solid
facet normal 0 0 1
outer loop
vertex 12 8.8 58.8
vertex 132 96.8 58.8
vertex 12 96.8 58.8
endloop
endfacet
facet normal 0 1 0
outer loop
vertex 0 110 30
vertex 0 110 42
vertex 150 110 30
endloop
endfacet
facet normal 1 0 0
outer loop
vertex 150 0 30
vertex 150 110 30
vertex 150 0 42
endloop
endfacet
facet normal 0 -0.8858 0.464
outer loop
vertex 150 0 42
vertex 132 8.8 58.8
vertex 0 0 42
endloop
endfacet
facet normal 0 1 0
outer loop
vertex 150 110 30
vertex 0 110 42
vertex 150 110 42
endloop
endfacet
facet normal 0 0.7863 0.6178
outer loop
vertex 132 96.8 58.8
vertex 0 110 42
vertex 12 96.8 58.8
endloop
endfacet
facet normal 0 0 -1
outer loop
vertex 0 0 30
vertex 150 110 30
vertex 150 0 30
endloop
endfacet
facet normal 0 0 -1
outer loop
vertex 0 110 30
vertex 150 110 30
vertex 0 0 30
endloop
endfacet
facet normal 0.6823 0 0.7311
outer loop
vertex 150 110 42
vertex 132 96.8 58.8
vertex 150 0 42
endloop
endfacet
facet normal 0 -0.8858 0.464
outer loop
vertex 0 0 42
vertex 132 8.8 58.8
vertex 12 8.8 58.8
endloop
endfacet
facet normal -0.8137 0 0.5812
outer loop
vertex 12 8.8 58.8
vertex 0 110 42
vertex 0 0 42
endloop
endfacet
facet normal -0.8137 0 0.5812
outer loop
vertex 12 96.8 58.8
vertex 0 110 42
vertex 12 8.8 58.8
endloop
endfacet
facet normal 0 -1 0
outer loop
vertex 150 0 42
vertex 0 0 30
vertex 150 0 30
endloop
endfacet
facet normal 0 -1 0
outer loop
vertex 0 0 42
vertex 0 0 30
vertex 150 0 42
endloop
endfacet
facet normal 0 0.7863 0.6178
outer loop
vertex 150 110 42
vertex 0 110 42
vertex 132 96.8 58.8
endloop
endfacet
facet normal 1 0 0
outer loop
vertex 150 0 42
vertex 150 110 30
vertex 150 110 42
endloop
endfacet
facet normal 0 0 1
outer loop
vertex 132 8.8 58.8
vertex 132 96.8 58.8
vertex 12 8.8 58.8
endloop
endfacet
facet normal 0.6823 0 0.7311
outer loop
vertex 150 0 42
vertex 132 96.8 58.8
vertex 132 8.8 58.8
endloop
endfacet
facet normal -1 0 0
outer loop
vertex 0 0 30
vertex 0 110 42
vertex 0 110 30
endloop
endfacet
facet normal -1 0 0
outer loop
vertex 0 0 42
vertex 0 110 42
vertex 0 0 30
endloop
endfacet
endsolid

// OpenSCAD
// LED dome — REFERENCE MOCKUP (non-printable, §6.1 / §5.5).
//
// Classification: reference_only (mockups playbook). NOT in parts.json, NOT
// unioned into any printed output. It approximates the 10x10 LED-matrix dome
// that sits on the tray deck over the cell openings.
//
// Source: docs/solarpunk_series.md §5.5 ("10x10 LED matrix... dome");
//         §6.1 open decision #2 (dome material/commodity LED choice undecided).
//
// Dimensions are PLACEHOLDER (dome size undecided) — parameterized, and to be
// reconciled with Phase 1 LED-matrix measurements.

led_dome_width   = is_undef(led_dome_width)   ? 150.0 : led_dome_width;
led_dome_depth   = is_undef(led_dome_depth)   ? 110.0 : led_dome_depth;
led_dome_height  = is_undef(led_dome_height)  ? 24.0  : led_dome_height;
led_dome_margin  = is_undef(led_dome_margin)  ? 6.0   : led_dome_margin;
led_dome_sides   = is_undef(led_dome_sides)   ? 4     : led_dome_sides;

module led_dome() {
    // A rounded, slightly domed clear housing above the deck (approximation).
    translate([0, 0, 30.0]) {
        hull() {
            cube([led_dome_width, led_dome_depth, led_dome_height * 0.5]);
            scale([0.8, 0.8, 1.0])
                translate([led_dome_width * 0.1, led_dome_depth * 0.1, led_dome_height * 0.5])
                    cube([led_dome_width, led_dome_depth, led_dome_height * 0.7]);
        }
    }
}

led_dome();
